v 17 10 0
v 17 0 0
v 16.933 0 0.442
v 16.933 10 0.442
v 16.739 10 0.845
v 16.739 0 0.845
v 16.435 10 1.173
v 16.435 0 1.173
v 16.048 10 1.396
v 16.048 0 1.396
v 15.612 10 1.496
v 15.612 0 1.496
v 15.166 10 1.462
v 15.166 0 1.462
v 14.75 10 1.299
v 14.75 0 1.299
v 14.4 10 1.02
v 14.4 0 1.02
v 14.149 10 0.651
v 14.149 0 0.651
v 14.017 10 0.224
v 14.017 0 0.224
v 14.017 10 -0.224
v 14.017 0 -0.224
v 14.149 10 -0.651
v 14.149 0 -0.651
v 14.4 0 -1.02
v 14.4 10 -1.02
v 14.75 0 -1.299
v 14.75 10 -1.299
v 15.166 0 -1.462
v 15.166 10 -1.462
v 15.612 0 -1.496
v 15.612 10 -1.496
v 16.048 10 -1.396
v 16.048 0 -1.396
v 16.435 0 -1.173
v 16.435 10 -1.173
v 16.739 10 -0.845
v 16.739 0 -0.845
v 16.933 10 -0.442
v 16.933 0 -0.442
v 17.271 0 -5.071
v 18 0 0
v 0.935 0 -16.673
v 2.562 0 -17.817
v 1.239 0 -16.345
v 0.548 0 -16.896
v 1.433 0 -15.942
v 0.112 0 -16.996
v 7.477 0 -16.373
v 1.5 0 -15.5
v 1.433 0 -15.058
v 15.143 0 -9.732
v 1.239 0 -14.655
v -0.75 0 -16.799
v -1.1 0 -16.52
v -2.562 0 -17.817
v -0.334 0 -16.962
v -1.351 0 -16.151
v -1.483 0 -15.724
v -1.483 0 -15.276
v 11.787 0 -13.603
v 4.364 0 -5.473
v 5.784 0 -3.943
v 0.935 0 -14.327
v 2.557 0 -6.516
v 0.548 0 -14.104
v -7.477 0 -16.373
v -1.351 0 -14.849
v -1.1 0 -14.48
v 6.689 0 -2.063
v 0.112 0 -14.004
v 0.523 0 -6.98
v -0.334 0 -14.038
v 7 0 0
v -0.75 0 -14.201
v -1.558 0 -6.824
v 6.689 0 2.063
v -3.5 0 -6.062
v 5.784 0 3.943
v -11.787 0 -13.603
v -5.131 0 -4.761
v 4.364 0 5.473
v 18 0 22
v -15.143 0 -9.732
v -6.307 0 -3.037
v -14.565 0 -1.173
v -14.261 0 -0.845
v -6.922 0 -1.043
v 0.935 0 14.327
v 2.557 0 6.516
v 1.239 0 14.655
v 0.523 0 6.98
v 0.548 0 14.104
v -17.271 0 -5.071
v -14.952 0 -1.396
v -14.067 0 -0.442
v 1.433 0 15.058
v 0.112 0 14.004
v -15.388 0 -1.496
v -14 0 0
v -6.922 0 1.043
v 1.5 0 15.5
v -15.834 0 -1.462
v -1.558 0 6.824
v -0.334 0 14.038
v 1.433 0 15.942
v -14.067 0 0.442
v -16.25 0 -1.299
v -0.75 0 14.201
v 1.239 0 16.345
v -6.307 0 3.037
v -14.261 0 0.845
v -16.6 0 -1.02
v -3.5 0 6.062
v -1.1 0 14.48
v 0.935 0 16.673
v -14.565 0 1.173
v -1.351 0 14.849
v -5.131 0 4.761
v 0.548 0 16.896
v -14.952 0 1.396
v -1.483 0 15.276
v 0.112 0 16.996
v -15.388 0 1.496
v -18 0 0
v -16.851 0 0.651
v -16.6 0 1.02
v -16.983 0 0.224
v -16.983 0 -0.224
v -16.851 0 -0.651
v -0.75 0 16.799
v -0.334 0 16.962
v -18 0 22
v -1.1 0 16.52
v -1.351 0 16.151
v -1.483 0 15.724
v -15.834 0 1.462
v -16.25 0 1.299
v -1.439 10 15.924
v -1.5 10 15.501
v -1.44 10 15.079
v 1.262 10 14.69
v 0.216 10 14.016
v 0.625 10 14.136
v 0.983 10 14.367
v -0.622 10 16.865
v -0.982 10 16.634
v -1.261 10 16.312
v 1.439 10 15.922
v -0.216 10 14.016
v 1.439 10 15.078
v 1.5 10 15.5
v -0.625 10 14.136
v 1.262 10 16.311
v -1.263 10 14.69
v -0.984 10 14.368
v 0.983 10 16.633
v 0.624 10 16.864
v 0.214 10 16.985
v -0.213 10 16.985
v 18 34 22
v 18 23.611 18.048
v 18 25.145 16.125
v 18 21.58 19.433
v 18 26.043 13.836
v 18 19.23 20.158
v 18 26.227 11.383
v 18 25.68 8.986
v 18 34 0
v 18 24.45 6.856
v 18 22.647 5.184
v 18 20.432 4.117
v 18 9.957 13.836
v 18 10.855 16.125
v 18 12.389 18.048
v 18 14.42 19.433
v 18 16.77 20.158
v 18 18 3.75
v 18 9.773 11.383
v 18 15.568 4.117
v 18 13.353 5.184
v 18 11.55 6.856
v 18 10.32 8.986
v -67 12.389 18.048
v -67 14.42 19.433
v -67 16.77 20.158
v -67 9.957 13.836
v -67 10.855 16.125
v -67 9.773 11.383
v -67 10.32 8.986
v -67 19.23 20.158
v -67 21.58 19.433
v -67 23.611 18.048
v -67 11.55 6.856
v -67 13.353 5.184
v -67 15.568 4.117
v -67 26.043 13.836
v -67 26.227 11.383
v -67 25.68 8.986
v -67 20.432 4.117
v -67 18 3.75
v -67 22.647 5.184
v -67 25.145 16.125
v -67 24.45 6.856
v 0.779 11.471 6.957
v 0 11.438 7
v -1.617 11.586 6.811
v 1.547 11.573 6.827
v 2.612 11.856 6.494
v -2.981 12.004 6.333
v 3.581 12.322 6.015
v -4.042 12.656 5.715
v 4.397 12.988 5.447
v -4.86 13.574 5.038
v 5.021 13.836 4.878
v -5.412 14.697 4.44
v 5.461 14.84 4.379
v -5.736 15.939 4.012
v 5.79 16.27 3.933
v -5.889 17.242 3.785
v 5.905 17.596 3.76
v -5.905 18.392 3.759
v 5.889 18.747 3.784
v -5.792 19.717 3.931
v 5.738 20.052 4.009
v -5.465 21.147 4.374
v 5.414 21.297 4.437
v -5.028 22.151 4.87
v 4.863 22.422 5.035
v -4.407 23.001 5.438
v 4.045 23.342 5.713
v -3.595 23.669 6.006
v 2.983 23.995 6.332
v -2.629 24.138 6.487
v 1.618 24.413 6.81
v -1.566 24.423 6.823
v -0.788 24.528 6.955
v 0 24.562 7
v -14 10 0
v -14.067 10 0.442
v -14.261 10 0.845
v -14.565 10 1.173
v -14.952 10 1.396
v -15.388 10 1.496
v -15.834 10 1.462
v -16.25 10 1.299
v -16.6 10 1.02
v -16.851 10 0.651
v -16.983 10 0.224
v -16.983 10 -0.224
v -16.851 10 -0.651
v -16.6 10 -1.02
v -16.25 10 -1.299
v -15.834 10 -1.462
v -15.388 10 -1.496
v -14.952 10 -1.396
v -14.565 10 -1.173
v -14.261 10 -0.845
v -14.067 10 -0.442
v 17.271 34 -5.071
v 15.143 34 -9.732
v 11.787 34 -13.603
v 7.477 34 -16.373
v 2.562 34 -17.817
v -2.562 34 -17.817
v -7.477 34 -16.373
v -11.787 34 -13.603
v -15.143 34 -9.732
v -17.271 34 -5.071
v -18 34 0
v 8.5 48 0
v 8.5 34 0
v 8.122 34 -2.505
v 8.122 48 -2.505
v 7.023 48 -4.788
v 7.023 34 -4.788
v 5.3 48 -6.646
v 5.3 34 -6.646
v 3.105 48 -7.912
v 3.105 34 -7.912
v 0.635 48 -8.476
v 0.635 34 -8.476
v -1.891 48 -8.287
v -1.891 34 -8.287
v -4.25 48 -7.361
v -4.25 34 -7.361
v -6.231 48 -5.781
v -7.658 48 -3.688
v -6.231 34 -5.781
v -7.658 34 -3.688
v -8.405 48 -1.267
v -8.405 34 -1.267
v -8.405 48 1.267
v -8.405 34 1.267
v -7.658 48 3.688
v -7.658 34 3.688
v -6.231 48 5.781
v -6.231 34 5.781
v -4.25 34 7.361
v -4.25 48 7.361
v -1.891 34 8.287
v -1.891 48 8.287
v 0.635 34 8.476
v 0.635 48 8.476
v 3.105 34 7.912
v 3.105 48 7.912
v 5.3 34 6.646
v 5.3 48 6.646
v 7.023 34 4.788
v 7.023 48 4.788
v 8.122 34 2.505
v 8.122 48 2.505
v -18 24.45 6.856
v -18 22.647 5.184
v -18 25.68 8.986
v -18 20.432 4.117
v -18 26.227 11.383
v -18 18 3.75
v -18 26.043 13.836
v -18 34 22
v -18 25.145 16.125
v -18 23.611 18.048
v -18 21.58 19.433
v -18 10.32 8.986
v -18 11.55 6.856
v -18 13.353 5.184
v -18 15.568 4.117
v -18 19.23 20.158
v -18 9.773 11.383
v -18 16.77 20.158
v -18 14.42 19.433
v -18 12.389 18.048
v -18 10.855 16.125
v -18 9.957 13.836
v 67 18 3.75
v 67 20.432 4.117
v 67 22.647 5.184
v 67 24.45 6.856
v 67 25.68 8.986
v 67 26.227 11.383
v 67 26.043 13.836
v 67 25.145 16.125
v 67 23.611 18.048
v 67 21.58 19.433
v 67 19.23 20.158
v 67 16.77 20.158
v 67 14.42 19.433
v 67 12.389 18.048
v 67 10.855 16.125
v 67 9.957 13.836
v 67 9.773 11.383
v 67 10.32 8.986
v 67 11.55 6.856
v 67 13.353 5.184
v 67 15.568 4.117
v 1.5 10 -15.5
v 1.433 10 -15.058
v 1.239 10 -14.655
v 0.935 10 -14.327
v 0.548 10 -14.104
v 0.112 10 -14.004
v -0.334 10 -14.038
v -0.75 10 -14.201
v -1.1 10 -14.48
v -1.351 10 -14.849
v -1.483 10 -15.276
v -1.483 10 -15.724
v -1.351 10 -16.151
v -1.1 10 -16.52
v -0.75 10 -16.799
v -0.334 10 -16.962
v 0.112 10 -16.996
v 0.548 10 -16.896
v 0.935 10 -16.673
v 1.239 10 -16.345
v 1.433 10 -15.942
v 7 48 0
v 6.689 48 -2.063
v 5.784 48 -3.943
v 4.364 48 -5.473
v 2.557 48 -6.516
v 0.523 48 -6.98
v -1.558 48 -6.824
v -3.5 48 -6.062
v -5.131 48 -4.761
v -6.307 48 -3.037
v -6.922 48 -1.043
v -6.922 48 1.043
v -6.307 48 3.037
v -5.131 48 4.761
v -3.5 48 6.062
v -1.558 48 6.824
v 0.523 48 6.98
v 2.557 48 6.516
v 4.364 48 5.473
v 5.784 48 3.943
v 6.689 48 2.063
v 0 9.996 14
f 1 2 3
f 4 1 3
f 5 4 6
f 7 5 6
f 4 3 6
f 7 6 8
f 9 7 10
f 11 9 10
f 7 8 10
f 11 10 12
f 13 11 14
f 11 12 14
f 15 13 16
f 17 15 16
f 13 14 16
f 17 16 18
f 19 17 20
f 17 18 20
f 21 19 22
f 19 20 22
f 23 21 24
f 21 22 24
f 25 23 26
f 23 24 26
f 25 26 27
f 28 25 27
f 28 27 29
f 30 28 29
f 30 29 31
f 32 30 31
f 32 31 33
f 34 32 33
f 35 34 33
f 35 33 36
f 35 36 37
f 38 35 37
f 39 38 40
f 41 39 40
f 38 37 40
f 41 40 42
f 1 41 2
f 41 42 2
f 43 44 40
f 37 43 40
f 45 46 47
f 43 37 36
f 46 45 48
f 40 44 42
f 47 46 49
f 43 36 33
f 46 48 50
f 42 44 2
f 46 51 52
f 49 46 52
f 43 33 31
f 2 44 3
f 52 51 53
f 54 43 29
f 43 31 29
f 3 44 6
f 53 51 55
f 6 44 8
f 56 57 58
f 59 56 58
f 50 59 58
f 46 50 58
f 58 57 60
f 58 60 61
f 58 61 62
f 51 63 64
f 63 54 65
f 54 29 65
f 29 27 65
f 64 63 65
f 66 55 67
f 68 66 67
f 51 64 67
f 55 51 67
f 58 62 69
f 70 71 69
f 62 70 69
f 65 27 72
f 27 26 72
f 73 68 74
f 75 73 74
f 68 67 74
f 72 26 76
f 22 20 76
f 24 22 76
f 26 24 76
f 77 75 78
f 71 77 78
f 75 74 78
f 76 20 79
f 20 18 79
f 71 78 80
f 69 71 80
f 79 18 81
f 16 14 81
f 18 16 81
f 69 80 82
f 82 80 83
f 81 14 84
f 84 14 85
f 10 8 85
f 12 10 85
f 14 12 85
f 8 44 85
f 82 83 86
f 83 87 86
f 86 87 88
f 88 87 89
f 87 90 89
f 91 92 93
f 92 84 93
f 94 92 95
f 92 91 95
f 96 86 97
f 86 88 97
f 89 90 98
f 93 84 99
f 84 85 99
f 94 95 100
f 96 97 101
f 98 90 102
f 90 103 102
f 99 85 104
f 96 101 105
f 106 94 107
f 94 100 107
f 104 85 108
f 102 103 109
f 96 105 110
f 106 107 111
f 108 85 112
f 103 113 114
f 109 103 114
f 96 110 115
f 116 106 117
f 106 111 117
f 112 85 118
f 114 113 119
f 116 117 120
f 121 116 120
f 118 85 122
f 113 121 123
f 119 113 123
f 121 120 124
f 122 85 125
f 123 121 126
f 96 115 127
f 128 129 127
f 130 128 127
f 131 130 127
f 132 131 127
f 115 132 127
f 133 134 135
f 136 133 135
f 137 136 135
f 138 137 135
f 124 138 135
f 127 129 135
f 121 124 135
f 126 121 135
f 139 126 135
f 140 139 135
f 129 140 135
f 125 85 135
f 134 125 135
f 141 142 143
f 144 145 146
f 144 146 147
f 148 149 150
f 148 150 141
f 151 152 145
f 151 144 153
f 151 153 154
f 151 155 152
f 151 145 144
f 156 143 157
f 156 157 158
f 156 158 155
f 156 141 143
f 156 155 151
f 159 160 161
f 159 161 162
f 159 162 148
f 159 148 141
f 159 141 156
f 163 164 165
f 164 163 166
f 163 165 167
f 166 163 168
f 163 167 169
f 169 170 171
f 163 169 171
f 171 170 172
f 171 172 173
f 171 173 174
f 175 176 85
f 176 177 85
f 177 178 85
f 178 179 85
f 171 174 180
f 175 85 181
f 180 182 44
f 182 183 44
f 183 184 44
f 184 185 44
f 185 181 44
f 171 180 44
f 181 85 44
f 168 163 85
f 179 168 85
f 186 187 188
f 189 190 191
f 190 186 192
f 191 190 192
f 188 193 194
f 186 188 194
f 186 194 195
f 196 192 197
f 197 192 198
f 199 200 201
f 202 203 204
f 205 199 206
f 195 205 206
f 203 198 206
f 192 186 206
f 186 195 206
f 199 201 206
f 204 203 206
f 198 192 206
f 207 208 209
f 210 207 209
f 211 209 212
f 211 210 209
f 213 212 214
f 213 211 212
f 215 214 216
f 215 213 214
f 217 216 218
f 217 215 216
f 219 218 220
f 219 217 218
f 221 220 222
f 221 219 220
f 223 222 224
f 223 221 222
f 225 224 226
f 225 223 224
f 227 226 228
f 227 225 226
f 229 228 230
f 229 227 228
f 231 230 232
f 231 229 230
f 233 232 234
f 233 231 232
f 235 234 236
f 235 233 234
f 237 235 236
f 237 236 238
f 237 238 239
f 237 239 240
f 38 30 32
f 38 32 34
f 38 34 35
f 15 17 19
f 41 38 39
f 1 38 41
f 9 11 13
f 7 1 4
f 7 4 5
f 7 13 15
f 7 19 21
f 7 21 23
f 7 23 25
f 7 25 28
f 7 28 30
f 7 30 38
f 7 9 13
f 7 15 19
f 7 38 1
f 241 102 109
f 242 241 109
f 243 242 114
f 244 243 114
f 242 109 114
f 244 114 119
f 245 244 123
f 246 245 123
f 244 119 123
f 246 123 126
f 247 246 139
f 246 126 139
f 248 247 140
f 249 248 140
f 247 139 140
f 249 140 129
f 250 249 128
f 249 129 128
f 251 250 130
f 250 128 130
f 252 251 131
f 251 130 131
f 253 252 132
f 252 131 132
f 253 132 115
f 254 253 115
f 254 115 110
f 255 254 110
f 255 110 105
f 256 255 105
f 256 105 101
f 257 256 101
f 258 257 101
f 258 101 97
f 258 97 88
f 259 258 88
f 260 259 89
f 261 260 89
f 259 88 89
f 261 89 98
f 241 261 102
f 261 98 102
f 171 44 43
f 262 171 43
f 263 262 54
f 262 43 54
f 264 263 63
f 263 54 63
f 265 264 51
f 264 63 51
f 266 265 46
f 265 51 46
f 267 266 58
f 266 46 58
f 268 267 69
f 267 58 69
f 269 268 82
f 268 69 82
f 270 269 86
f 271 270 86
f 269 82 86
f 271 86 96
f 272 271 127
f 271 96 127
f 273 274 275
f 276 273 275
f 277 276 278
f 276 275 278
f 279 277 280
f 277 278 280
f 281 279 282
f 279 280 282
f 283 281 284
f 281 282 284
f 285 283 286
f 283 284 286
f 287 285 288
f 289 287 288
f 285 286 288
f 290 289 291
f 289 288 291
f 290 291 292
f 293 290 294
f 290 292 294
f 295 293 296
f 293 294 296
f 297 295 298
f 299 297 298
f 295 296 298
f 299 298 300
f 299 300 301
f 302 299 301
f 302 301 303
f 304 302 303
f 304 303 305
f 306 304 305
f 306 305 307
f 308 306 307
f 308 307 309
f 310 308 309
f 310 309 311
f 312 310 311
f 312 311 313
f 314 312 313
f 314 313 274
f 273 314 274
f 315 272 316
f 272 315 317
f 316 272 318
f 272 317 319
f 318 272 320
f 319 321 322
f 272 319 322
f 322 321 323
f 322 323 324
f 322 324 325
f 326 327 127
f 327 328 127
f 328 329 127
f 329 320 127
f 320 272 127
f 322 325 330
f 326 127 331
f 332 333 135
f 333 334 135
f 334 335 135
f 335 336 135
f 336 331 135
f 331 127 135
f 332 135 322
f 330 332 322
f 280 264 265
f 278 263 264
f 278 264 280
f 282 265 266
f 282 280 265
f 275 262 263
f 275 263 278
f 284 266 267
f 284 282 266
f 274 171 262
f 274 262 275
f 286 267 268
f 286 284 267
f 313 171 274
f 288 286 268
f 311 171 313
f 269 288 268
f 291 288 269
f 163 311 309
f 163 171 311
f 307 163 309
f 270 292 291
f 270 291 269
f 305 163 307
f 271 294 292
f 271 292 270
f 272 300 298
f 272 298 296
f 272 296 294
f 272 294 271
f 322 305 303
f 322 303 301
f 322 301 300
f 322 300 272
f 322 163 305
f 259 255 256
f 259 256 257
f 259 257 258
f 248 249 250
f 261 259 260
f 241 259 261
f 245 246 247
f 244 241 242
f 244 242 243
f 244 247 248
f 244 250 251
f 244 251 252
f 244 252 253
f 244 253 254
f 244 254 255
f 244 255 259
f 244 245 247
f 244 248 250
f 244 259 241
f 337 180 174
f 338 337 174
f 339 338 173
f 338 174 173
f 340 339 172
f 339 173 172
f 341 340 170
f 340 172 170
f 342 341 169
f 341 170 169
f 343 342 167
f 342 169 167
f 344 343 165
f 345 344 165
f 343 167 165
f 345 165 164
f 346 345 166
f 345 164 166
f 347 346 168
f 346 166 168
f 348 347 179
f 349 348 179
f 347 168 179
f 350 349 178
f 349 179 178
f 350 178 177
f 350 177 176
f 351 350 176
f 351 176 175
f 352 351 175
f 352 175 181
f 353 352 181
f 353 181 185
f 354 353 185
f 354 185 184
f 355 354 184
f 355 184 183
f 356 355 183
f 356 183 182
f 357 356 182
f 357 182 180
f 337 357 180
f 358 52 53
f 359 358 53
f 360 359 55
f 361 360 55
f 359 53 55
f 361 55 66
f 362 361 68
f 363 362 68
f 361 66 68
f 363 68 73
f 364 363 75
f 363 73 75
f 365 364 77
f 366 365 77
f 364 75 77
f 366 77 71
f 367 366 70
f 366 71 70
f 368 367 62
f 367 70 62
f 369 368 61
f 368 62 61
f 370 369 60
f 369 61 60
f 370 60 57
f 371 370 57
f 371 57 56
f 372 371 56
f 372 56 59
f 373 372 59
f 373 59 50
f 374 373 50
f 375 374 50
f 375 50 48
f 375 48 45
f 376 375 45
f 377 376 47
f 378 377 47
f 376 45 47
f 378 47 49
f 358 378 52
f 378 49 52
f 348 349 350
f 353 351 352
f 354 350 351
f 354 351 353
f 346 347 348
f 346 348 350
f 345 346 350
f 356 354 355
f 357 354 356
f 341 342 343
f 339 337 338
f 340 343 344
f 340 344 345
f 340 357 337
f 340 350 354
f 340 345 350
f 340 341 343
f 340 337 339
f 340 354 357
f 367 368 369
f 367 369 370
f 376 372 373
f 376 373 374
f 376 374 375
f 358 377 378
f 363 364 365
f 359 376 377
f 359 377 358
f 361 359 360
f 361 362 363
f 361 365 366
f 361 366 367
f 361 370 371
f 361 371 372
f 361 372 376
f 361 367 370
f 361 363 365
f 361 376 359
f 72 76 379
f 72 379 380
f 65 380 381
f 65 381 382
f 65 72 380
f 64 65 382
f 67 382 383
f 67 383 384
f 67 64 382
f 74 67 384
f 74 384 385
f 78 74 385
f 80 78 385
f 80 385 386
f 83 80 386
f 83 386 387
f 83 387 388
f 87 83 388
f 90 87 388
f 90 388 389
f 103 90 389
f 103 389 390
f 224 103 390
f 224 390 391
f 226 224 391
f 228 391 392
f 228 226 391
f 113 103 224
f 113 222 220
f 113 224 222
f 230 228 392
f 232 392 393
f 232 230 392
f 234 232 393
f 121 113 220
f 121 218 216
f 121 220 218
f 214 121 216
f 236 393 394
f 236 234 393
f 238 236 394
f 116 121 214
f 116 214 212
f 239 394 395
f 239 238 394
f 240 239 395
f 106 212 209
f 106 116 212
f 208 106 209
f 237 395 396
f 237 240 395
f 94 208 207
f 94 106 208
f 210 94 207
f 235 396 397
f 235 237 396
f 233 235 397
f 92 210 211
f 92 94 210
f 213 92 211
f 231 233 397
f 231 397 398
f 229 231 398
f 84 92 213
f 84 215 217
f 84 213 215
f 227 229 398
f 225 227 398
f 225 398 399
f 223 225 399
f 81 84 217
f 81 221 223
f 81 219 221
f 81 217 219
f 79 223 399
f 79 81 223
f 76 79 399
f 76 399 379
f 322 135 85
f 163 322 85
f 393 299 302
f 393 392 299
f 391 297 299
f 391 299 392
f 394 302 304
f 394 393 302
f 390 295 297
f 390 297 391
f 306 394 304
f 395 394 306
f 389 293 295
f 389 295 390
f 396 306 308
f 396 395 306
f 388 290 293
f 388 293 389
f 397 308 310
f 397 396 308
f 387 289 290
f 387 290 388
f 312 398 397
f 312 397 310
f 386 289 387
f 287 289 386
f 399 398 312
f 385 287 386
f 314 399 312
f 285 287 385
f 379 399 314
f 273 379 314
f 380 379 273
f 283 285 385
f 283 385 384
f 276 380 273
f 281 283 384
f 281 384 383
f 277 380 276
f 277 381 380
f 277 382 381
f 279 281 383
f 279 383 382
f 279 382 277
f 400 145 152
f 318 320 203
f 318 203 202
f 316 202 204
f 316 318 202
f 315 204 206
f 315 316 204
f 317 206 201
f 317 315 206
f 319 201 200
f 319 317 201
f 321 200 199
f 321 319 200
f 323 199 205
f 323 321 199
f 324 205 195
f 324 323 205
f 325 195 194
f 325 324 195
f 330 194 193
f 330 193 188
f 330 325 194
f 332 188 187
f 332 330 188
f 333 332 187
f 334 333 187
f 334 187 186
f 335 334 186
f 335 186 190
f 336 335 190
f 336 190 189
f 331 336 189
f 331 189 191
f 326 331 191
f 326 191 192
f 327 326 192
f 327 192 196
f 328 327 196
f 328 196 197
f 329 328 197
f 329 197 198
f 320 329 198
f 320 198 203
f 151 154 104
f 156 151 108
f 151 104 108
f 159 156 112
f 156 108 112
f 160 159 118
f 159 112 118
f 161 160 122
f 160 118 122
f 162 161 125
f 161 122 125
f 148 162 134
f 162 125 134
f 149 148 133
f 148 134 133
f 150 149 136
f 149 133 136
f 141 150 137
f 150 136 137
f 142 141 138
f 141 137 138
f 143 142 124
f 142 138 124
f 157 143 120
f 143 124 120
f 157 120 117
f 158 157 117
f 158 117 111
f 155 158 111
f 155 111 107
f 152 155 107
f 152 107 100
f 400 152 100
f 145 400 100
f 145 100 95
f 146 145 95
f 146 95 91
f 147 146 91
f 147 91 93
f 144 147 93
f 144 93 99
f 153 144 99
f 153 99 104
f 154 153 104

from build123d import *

# Parameters (mm, degrees)
SKETCH1_R                = 8.5
SKETCH1_R_2              = 7
BOSS_EXTRUDE1_DEPTH      = 48
SKETCH2_R                = 8.5
BOSS_EXTRUDE2_DEPTH      = 34
SKETCH3_R                = 1.5
CUT_EXTRUDE1_DEPTH       = 10
SKETCH4_R                = 8.25
BOSS_EXTRUDE3_DEPTH      = 67
BOSS_EXTRUDE3_DEPTH_BACK = 67


with BuildPart() as part:
    # Sketch1 → Boss-Extrude1 (new body)
    with BuildSketch(Plane(origin=(0, 0, 0), x_dir=(1, 0, 0), z_dir=(0, 1, 0))):
        Circle(SKETCH1_R)
        Circle(SKETCH1_R_2, mode=Mode.SUBTRACT)
    extrude(amount=BOSS_EXTRUDE1_DEPTH)

    # Sketch2 → Boss-Extrude2 (add)
    with BuildSketch(Plane.XZ):
        with BuildLine():
            Line((-18, 22), (18, 22))
            Line((18, 22), (18, 0))
            ThreePointArc((18, 0), (0, -18), (-18, 0))
            Line((-18, 0), (-18, 22))
        make_face()
        Circle(SKETCH2_R, mode=Mode.SUBTRACT)
    extrude(amount=-BOSS_EXTRUDE2_DEPTH)

    # Sketch3 → Cut-Extrude1 (cut)
    with BuildSketch(Plane.XZ):
        with Locations((0, -15.5)):
            Circle(SKETCH3_R)
        with Locations((-15.5, 0)):
            Circle(SKETCH3_R)
        with Locations((0, 15.5)):
            Circle(SKETCH3_R)
        with Locations((15.5, 0)):
            Circle(SKETCH3_R)
    extrude(amount=-CUT_EXTRUDE1_DEPTH, mode=Mode.SUBTRACT)

    # Sketch4 → Boss-Extrude3 (add, two sides)
    with BuildSketch(Plane(origin=(0, 0, 0), x_dir=(0, 0, -1), z_dir=(1, 0, 0))) as boss_extrude3_sk:
        with Locations((-12, 18)):
            Circle(SKETCH4_R)
    extrude(amount=BOSS_EXTRUDE3_DEPTH)
    extrude(boss_extrude3_sk.sketch, amount=-BOSS_EXTRUDE3_DEPTH_BACK)


solid = part.part
